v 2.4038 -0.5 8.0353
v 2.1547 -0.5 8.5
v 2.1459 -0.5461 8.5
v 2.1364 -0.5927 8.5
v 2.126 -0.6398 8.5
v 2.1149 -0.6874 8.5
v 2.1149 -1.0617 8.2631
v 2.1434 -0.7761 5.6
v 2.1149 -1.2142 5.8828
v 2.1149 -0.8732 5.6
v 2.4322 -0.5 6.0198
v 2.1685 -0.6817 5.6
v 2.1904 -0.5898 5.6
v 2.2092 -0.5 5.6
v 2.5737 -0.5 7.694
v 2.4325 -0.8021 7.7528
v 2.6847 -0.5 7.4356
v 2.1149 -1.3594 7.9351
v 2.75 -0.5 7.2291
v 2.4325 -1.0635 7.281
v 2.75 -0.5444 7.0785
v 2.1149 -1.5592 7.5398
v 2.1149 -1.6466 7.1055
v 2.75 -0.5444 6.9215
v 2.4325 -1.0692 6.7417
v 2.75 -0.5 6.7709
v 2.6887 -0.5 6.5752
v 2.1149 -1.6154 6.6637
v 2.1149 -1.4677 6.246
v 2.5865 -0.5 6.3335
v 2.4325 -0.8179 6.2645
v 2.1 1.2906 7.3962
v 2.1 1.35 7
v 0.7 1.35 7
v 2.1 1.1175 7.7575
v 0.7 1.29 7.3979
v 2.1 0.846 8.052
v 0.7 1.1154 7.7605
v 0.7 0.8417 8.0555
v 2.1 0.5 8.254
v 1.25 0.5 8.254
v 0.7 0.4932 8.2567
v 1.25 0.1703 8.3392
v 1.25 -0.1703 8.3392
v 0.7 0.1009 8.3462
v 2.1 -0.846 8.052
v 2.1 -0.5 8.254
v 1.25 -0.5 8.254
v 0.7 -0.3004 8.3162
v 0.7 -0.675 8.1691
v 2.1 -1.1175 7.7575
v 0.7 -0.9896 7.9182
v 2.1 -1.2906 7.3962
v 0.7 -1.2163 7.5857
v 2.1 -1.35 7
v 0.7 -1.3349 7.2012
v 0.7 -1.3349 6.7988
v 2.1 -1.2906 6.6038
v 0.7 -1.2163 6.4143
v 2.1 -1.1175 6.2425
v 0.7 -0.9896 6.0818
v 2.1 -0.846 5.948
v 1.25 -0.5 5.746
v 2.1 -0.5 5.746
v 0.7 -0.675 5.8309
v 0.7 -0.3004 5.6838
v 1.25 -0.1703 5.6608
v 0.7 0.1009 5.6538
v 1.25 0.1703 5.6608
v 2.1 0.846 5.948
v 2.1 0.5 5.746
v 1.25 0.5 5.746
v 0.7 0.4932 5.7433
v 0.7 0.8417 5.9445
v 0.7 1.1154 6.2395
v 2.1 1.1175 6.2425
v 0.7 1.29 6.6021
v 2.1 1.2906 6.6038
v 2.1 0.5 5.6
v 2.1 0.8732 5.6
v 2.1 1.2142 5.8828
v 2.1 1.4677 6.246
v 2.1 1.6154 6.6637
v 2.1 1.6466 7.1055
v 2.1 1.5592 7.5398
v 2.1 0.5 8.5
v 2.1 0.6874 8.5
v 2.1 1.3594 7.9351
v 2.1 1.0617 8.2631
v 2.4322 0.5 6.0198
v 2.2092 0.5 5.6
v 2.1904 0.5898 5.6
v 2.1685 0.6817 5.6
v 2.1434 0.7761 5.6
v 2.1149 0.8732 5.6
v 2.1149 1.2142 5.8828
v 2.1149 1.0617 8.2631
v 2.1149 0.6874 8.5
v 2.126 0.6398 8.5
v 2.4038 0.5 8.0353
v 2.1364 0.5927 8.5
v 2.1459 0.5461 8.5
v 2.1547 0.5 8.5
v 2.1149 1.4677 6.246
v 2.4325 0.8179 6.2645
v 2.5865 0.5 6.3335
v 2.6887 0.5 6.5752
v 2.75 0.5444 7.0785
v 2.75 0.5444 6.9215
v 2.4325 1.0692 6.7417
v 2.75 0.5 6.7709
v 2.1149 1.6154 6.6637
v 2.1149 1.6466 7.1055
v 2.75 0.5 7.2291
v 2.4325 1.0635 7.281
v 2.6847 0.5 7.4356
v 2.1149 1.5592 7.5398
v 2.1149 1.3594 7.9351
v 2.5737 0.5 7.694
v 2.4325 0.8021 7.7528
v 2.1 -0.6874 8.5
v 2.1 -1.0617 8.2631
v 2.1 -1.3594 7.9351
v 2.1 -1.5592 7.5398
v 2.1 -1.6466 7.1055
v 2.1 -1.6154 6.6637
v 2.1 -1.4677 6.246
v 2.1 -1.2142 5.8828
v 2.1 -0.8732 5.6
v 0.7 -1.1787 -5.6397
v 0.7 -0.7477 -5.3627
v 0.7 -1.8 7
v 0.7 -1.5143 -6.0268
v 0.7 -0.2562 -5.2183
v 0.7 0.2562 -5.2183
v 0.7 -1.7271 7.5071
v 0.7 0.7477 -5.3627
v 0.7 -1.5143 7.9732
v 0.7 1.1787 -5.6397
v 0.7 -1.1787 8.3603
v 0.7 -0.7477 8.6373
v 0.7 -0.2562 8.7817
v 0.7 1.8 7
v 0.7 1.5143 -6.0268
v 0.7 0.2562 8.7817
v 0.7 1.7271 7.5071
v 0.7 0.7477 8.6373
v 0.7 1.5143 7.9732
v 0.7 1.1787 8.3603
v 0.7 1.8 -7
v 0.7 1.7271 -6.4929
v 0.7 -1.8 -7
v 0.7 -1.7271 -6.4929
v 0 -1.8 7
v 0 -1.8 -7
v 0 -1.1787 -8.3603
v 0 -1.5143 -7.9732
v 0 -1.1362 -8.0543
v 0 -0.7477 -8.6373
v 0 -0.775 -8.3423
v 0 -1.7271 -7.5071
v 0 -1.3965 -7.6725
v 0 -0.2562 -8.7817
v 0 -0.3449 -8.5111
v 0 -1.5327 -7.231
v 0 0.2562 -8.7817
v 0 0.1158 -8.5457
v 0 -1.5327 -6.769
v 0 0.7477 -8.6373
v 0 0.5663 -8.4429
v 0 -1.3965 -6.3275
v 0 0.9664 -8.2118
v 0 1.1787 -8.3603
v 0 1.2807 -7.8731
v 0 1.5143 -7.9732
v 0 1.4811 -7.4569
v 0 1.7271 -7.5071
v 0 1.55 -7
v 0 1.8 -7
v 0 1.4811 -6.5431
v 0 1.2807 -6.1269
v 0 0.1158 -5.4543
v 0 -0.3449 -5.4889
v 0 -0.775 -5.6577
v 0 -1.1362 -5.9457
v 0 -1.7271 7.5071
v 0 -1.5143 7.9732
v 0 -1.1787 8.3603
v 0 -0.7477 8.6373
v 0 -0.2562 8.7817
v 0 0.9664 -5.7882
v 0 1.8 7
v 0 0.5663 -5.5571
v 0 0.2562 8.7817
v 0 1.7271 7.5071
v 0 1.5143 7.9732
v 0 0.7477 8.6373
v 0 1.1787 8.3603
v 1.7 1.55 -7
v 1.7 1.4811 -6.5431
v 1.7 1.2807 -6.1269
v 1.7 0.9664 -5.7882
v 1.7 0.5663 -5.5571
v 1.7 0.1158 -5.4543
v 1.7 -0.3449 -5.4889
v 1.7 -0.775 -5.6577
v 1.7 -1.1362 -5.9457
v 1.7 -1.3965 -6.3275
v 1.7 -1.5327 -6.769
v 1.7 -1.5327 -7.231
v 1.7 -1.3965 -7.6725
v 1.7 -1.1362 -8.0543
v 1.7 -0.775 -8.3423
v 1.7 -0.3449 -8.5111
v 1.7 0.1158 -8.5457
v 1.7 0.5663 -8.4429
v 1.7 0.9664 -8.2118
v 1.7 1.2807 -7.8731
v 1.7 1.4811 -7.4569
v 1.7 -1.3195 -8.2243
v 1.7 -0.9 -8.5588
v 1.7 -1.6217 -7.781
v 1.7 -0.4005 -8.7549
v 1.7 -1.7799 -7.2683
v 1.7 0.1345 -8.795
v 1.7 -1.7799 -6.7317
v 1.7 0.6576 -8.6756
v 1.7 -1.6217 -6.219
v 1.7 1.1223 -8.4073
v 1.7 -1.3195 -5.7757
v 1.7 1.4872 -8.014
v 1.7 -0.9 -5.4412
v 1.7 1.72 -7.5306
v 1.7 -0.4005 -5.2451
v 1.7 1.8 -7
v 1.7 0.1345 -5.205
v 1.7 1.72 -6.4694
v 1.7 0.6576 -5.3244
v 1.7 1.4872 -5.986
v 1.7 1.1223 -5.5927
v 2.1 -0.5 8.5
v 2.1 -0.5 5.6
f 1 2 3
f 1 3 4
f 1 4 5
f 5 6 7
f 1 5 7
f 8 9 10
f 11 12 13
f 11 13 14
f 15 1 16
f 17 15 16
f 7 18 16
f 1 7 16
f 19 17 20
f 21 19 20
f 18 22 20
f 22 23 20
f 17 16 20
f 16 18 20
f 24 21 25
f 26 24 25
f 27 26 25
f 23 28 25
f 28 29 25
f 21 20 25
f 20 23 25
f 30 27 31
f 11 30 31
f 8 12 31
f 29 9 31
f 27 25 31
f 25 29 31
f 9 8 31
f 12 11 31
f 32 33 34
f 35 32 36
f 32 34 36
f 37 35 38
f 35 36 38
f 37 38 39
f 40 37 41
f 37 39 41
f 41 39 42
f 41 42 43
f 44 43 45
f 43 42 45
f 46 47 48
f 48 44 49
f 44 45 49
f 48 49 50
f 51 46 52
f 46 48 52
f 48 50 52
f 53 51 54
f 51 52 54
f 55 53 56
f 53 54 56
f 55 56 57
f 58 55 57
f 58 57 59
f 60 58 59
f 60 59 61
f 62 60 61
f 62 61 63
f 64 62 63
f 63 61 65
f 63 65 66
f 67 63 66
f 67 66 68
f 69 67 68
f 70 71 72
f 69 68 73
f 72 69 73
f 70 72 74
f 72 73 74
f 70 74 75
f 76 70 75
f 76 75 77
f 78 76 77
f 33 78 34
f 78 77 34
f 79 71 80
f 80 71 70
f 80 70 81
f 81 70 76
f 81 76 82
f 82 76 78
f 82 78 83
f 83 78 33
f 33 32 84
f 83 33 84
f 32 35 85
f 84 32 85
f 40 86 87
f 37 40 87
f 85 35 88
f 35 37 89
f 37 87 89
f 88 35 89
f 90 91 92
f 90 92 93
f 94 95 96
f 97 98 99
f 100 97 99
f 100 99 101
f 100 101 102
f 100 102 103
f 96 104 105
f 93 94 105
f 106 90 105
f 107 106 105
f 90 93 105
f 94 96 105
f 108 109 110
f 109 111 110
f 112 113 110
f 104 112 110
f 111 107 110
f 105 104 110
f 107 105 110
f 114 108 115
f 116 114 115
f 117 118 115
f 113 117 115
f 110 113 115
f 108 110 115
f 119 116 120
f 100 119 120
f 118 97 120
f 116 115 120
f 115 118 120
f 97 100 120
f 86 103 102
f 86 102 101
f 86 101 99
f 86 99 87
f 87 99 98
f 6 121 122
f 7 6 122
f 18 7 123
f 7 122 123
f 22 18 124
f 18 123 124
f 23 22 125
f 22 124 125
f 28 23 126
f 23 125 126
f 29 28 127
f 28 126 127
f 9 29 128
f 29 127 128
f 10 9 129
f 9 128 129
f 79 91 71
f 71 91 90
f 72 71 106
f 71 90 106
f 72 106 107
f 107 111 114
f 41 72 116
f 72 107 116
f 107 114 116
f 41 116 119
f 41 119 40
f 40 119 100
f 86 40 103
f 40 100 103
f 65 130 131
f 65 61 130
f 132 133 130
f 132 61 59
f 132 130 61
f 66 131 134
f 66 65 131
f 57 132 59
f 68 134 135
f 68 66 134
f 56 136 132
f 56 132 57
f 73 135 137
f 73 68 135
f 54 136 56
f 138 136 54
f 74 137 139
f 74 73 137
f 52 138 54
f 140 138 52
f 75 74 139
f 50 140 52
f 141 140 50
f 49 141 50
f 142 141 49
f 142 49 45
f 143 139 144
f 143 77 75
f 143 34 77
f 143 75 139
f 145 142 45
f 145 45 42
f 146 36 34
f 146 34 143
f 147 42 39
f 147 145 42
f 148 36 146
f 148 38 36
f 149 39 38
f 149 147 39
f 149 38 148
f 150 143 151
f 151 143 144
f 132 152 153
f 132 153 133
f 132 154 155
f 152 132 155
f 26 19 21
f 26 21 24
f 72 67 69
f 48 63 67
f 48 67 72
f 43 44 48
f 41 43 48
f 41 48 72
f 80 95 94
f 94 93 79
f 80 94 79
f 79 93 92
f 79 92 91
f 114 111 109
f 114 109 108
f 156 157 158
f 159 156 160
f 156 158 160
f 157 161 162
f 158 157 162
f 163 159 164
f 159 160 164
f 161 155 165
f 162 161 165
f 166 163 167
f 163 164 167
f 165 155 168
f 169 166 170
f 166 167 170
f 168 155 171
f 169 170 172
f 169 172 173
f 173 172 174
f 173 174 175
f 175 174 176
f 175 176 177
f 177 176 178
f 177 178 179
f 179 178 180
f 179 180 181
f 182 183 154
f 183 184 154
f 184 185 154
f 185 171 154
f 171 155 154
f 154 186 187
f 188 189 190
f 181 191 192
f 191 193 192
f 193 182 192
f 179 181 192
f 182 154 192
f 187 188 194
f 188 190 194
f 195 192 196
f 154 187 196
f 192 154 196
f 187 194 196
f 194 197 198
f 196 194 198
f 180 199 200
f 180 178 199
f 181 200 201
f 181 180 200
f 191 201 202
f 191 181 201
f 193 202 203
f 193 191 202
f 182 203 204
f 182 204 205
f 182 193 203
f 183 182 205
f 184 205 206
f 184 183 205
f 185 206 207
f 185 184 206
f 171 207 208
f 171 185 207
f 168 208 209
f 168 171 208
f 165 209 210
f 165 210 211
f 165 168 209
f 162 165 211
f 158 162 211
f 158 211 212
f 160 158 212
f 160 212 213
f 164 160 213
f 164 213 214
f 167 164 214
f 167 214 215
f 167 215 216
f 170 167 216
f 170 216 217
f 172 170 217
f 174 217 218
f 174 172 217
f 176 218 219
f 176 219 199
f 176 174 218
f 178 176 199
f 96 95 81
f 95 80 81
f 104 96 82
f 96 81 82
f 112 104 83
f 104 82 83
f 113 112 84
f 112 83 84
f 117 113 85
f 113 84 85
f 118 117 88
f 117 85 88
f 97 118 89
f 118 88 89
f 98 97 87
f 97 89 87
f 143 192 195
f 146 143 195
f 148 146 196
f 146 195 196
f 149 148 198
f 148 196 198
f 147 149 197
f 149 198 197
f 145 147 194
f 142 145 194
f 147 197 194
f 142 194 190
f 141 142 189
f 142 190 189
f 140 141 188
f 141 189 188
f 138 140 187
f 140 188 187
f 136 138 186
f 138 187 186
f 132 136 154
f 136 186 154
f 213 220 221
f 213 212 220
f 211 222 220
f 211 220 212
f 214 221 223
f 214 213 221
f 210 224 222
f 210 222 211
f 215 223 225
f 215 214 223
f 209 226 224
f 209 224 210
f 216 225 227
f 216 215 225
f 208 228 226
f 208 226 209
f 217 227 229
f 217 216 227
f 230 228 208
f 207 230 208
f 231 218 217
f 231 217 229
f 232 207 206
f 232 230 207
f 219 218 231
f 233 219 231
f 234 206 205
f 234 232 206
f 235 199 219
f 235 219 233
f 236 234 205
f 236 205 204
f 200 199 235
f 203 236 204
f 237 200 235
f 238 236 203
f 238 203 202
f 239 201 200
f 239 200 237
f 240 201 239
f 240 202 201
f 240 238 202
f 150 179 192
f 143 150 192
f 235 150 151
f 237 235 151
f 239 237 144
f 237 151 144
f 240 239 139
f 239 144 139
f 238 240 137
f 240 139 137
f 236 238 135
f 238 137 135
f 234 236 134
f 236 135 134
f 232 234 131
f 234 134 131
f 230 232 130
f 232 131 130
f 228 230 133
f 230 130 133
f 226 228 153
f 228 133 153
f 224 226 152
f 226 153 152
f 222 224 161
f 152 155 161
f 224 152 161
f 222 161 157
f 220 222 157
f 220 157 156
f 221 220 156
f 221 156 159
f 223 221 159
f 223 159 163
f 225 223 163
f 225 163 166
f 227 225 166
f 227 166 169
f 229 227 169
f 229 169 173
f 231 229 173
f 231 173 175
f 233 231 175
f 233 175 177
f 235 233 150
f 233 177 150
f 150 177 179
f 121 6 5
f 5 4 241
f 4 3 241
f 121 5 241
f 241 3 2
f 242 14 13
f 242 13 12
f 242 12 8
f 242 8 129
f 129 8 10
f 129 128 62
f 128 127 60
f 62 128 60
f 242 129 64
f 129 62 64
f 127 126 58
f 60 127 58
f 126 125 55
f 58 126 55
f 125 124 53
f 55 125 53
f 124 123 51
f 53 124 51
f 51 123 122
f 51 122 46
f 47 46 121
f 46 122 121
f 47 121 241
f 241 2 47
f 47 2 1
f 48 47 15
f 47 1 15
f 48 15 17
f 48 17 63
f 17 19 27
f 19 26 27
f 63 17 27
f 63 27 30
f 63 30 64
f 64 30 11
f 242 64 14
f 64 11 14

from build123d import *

# Parameters (mm, degrees)
F0_R      = 1.55
F1_DEPTH  = 0.7
F2_R      = 1.35
F3_DEPTH  = 1.4
F4_R      = 1.65
F5_DEPTH  = 0.65
F6_SIZE2  = 0.6350852961
F6_SIZE   = 1.1
F8_DEPTH  = 1.5
F9_R      = 1.8
F9_R_2    = 1.55
F10_DEPTH = 1


with BuildPart() as f1:
    # F0 (on Right) → F1 (new body)
    with BuildSketch(Plane.YZ):
        with BuildLine():
            Line((1.8, -7), (1.8, 7))
            ThreePointArc((1.8, 7), (0, 8.8), (-1.8, 7))
            Line((-1.8, 7), (-1.8, -7))
            ThreePointArc((-1.8, -7), (0, -8.8), (1.8, -7))
        make_face()
        with Locations((0, -7)):
            Circle(F0_R, mode=Mode.SUBTRACT)
    extrude(amount=F1_DEPTH)

    # F2 (on face) → F3 (join)
    with BuildSketch(Plane.YZ.offset(0.7)):
        with Locations((0, 7)):
            Circle(F2_R)
    extrude(amount=F3_DEPTH)

    # F4 (on face) → F5 (join)
    with BuildSketch(Plane.YZ.offset(2.1)):
        with Locations((0, 7)):
            Circle(F4_R)
    extrude(amount=F5_DEPTH)

    # F6
    f6_edges = [f1.edges().sort_by_distance(p)[0] for p in [
        (2.75, -1.65, 7),
    ]]
    f6_side = f1.faces().sort_by_distance((2.75, 0, 7))[0]
    chamfer(f6_edges, length=F6_SIZE, length2=F6_SIZE2, reference=f6_side)

    # F7 (on face) → F8 (cut)
    with BuildSketch(Plane.YZ.offset(2.75)):
        with BuildLine():
            Line((0.5, 8.8), (-0.5, 8.8))
            Line((-0.5, 8.8), (-1, 8.8))
            Line((-1, 8.8), (-1, 8.5))
            Line((-1, 8.5), (-0.5, 8.5))
            Line((-0.5, 8.5), (-0.5, 7.2291287847))
            ThreePointArc((-0.5, 7.2291287847), (0, 7.55), (0.5, 7.2291287847))
            Line((0.5, 7.2291287847), (0.5, 8.5))
            Line((0.5, 8.5), (1, 8.5))
            Line((1, 8.5), (1, 8.8))
            Line((1, 8.8), (0.5, 8.8))
        make_face()
        with BuildLine():
            ThreePointArc((0.5, 7.2291287847), (0, 7.55), (-0.5, 7.2291287847))
            Line((-0.5, 7.2291287847), (-0.5, 6.7708712153))
            ThreePointArc((-0.5, 6.7708712153), (0, 6.45), (0.5, 6.7708712153))
            Line((0.5, 6.7708712153), (0.5, 7.2291287847))
        make_face()
        with BuildLine():
            ThreePointArc((0.5, 6.7708712153), (0, 6.45), (-0.5, 6.7708712153))
            Line((-0.5, 6.7708712153), (-0.5, 5.6))
            Line((-0.5, 5.6), (-1, 5.6))
            Line((-1, 5.6), (-1, 5.3))
            Line((-1, 5.3), (-0.5, 5.3))
            Line((-0.5, 5.3), (0.5, 5.3))
            Line((0.5, 5.3), (1, 5.3))
            Line((1, 5.3), (1, 5.6))
            Line((1, 5.6), (0.5, 5.6))
            Line((0.5, 5.6), (0.5, 6.7708712153))
        make_face()
    extrude(amount=-F8_DEPTH, mode=Mode.SUBTRACT)

    # F9 (on face) → F10 (join)
    with BuildSketch(Plane.YZ.offset(0.7)):
        with Locations((0, -7)):
            Circle(F9_R)
        with Locations((0, -7)):
            Circle(F9_R_2, mode=Mode.SUBTRACT)
    extrude(amount=F10_DEPTH)


solid = f1.part
